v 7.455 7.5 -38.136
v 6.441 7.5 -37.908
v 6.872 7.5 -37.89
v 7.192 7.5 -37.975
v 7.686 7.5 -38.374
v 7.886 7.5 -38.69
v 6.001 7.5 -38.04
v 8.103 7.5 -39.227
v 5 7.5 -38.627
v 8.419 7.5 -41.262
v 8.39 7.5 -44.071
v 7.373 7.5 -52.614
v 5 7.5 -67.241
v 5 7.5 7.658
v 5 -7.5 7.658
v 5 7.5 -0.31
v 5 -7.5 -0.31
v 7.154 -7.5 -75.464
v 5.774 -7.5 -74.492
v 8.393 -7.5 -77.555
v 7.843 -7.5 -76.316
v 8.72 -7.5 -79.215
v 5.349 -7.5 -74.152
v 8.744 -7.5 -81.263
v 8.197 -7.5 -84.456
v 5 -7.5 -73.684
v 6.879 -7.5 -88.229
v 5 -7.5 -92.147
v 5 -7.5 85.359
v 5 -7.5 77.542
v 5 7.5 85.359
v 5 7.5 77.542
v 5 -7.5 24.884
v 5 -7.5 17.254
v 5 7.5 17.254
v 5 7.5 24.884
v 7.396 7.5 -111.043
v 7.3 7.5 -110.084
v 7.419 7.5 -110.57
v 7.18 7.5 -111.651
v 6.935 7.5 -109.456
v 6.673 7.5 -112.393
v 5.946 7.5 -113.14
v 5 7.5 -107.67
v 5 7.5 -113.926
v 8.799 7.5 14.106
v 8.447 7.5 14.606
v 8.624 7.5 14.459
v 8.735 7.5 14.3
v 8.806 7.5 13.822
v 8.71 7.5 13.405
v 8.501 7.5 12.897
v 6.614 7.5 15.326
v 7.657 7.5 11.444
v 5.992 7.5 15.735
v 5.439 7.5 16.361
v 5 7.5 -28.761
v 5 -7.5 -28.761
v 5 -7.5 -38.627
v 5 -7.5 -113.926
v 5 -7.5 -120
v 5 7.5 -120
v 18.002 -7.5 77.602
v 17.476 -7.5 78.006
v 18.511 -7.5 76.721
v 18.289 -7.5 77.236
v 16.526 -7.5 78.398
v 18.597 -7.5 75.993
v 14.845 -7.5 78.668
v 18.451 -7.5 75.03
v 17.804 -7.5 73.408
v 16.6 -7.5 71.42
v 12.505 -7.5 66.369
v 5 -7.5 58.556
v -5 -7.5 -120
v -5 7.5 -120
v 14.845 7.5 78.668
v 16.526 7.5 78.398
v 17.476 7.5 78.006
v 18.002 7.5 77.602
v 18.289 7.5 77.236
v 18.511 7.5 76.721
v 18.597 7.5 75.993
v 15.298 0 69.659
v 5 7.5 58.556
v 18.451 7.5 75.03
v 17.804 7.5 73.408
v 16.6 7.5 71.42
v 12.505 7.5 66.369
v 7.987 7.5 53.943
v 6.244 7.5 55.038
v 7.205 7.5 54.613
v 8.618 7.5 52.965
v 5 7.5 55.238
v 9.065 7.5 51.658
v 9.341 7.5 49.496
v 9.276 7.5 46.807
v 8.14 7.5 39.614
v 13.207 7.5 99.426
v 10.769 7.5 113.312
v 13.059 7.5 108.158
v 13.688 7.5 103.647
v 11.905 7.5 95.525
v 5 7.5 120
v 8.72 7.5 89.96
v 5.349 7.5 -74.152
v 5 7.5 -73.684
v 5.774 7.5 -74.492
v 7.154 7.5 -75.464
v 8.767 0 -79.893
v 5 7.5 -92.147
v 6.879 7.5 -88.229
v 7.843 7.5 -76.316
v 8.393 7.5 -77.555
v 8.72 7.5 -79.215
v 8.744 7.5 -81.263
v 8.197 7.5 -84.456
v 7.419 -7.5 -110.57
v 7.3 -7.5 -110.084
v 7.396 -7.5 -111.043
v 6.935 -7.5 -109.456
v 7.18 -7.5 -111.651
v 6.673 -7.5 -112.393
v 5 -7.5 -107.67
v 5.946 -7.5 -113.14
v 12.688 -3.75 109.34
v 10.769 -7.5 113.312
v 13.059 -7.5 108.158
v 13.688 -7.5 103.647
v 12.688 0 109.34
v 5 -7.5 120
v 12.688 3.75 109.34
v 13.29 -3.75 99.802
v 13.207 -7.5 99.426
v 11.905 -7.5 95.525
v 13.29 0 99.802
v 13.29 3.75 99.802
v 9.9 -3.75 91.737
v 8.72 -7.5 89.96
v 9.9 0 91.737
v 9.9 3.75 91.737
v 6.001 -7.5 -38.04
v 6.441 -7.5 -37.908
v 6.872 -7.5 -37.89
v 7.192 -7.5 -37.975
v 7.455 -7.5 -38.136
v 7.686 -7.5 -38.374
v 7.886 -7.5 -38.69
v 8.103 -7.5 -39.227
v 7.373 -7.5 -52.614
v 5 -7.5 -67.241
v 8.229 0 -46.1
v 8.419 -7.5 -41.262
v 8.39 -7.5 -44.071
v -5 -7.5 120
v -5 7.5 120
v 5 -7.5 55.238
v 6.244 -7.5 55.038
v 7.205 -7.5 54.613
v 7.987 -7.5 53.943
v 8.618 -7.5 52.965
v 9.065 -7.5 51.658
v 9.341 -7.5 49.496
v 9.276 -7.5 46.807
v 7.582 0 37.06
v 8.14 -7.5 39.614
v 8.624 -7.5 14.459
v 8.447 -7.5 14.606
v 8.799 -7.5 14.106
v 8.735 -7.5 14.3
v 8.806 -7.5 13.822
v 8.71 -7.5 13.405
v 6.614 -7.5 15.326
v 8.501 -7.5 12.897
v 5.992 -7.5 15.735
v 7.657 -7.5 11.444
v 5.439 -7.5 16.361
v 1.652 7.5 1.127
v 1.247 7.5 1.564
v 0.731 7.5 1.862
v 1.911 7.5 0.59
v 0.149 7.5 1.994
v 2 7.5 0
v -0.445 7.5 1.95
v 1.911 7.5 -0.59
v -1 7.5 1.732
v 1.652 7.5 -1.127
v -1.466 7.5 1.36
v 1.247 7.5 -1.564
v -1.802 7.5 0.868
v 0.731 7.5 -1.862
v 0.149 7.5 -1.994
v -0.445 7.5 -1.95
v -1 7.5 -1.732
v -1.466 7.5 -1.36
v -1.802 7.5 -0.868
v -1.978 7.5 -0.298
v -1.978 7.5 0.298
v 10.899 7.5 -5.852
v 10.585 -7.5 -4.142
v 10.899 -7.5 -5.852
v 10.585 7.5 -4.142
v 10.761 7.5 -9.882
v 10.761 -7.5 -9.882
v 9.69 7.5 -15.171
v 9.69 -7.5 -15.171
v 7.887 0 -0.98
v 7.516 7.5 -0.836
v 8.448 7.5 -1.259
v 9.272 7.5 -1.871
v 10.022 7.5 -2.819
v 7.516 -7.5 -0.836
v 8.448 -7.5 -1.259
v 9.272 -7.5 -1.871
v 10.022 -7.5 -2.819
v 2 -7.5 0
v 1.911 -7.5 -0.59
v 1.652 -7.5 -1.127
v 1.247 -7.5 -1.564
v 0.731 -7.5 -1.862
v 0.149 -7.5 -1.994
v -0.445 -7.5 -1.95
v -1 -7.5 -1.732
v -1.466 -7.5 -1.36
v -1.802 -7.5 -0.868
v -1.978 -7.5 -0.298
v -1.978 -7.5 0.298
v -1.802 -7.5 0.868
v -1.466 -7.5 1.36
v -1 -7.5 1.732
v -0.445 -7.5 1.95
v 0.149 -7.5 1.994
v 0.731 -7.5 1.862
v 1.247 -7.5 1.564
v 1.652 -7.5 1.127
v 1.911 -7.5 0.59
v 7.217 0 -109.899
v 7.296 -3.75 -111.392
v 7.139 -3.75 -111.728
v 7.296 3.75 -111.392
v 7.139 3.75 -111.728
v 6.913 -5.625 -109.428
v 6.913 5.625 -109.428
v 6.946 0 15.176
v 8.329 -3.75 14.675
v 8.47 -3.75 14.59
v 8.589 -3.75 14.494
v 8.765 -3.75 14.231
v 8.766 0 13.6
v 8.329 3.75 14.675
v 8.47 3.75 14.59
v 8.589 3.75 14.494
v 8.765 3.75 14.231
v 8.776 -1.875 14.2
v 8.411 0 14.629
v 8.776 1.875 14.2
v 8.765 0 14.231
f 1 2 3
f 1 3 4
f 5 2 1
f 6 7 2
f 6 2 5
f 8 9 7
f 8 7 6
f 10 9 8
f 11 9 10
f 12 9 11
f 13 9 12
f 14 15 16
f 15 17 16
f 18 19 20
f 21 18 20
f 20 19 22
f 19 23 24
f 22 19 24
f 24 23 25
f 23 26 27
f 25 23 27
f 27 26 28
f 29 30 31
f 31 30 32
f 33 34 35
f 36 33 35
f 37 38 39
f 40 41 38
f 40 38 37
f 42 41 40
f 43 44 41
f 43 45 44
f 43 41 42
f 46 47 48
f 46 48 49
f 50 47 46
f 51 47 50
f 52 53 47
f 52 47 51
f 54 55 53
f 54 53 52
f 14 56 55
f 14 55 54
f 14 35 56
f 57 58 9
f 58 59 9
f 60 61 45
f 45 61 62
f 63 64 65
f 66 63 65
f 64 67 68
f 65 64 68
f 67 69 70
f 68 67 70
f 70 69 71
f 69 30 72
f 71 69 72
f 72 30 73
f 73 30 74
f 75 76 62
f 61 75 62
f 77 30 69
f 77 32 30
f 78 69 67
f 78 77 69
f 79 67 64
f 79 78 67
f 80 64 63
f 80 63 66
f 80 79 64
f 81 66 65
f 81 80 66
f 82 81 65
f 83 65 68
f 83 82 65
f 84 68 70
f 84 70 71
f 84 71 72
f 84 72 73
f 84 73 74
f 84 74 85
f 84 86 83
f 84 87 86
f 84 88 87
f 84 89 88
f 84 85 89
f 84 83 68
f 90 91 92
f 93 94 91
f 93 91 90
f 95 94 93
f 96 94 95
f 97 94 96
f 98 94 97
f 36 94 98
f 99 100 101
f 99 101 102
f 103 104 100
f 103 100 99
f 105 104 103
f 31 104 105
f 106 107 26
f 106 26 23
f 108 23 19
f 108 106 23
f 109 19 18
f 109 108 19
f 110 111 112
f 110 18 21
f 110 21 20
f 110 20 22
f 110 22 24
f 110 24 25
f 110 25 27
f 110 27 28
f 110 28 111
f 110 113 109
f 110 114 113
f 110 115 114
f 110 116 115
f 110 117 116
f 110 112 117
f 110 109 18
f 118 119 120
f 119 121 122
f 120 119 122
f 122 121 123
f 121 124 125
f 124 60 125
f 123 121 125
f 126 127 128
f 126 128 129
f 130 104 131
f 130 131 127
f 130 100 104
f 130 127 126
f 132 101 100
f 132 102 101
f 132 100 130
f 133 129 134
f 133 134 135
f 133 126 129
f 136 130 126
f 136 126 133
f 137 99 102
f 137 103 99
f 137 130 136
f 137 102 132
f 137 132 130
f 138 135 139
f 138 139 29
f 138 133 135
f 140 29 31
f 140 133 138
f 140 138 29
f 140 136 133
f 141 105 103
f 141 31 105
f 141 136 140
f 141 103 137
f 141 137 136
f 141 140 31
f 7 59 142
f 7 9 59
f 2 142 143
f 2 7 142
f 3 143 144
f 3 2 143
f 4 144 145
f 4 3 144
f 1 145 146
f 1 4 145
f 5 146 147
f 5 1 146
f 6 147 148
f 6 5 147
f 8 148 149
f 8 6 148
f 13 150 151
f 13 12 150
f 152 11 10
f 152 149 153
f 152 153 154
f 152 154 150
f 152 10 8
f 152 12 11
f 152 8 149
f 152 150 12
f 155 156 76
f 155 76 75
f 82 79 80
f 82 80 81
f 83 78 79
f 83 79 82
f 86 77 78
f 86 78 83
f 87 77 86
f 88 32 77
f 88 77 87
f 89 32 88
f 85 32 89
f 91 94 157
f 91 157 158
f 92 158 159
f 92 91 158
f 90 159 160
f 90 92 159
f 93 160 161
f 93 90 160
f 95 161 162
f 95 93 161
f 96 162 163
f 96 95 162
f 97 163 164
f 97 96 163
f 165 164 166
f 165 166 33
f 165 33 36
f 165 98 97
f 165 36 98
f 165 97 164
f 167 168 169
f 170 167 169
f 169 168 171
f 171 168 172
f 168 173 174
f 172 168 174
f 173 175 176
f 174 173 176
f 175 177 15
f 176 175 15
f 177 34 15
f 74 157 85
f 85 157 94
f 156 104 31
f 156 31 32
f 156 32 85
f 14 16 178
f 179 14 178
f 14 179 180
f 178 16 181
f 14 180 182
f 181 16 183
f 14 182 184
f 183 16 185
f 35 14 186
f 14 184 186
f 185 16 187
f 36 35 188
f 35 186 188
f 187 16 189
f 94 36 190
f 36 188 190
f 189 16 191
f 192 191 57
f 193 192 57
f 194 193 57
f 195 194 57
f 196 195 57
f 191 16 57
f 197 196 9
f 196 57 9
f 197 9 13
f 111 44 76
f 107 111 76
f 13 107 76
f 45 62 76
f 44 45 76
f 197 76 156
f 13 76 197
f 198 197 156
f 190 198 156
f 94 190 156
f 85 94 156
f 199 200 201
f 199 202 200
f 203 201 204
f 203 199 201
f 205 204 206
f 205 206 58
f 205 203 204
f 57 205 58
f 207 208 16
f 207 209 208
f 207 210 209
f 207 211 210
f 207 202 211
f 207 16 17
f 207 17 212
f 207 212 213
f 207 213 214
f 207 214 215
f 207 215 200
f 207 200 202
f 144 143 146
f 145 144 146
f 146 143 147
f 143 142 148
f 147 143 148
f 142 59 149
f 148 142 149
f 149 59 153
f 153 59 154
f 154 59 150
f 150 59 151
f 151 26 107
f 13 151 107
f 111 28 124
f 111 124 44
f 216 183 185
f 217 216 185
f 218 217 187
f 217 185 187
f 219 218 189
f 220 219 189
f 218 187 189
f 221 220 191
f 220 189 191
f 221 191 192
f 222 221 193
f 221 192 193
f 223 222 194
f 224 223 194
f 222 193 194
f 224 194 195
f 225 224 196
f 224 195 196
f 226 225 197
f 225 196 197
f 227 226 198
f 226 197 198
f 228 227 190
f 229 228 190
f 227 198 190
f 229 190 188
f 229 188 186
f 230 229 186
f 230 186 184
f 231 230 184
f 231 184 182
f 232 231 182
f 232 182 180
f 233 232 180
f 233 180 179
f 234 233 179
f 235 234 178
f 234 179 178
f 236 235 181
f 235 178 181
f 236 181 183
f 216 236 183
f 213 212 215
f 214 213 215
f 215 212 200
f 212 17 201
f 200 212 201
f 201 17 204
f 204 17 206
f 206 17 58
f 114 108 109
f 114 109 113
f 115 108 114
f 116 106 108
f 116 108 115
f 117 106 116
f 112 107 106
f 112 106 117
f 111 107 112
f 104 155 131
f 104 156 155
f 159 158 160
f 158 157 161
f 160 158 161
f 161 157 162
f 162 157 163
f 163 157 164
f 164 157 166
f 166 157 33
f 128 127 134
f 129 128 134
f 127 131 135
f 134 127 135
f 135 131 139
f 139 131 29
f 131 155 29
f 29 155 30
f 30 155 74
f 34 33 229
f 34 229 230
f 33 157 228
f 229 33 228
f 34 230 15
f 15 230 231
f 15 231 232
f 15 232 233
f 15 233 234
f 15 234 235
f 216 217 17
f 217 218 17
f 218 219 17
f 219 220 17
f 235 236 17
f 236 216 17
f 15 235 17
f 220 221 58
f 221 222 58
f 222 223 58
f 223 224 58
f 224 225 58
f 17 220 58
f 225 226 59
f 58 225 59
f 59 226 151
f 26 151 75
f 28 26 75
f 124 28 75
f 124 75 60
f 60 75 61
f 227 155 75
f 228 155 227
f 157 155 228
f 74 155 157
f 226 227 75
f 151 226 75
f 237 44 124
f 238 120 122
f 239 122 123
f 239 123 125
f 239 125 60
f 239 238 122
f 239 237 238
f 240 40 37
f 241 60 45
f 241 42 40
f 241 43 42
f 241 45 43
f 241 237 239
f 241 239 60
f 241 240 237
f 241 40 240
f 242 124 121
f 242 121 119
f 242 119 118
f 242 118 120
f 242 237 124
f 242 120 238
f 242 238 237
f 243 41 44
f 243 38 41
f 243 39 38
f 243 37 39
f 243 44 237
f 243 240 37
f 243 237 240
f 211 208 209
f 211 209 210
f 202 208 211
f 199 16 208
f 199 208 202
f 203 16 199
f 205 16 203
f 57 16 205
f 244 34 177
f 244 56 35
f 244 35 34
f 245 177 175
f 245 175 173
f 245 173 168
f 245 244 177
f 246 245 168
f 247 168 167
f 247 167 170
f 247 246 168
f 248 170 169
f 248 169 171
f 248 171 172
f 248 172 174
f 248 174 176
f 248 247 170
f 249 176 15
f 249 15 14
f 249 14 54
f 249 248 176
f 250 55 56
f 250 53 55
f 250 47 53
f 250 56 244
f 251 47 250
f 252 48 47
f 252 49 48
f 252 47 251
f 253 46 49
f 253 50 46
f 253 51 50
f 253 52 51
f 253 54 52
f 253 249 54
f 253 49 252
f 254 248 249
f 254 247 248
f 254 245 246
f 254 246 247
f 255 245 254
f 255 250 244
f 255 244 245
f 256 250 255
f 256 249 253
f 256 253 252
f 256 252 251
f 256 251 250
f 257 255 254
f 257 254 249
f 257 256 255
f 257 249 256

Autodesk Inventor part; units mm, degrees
ref_plane "YZ Plane" through (0, 0, 0) normal (1, 0, 0) x (0, 1, 0)
ref_plane "XZ Plane" through (0, 0, 0) normal (0, 1, 0) x (-1, 0, 0)
ref_plane "XY Plane" through (0, 0, 0) normal (0, 0, 1) x (1, 0, 0)
sketch "Эскиз1" plane through (0, 0, 0) normal (0, 0, 1) x (1, 0, 0)
  line L0 (-5, -7.5) -> (5, -7.5)
  line L1 (5, -7.5) -> (5, 7.5)
  line L2 (5, 7.5) -> (-5, 7.5)
  line L3 (-5, 7.5) -> (-5, -7.5)
  line L4 (-5, -7.5) -> (5, 7.5) construction
  line L5 (5, -7.5) -> (-5, 7.5) construction
  point P0 (0, 0)
  dimension "d0" = 10
  dimension "d1" = 15
extrude "Выдавливание1" add sketch "Эскиз1" along normal mid plane 240
sketch "Эскиз3" plane through (-5, 7.5, 120) normal (0, 1, 0) x (1, 0, 0)
  line L0 (10, 0) -> (22.4133, 11.0717) construction
  line L1 (10, 240) -> (10, 0) projected
  line L2 (18.7544, 123.2595) -> (14.9087, 136.6513) construction
  line L3 (14.9087, 136.6513) -> (10, 148.7613) construction
  line L4 (12.2217, 156.9873) -> (15.1095, 158.4366) construction
  line L5 (10, 158.6272) -> (12.2217, 156.9873) construction
  spline S0 degree 4 poles (10, 120.3104) (10.6885, 120.4) (14.5524, 120.9622) (18.7544, 123.2595) (14.9087, 136.6513) (10, 148.7613) knots 7.806725 7.806725 7.806725 7.806725 7.806725 8 8.816044 8.816044 8.816044 8.816044 8.816044
  line L6 (16.1722, 104.0435) -> (12.6846, 108.5719) construction
  line L7 (12.6846, 108.5719) -> (10, 112.3423) construction
  line L8 (14.5524, 120.9622) -> (18.7544, 123.2595) construction
  line L9 (10.6885, 120.4) -> (14.5524, 120.9622) construction
  line L10 (10, 120.3104) -> (10.6885, 120.4) construction
  line L11 (19.5701, 51.9157) -> (11.8452, 59.5335) construction
  line L12 (11.8452, 59.5335) -> (10, 61.4441) construction
  line L13 (12.6625, 64.9164) -> (17.1948, 66.8214) construction
  line L14 (10, 64.7616) -> (12.6625, 64.9164) construction
  spline S1 degree 4 poles (10, 0) (22.4133, 11.0717) (20.5125, 21.2759) (14.9788, 29.1456) (10, 34.6409) knots 1 1 1 1 1 1.479533 1.479533 1.479533 1.479533 1.479533
  spline S2 degree 4 poles (10, 42.4578) (17.8063, 40.9171) (31.518, 38.9171) (19.5701, 51.9157) (11.8452, 59.5335) (10, 61.4441) knots 2.157548 2.157548 2.157548 2.157548 2.157548 3 3.460409 3.460409 3.460409 3.460409 3.460409
  line L15 (22.4133, 11.0717) -> (20.5125, 21.2759) construction
  line L16 (20.5125, 21.2759) -> (14.9788, 29.1456) construction
  line L17 (14.9788, 29.1456) -> (10, 34.6409) construction
  line L18 (31.518, 38.9171) -> (19.5701, 51.9157) construction
  line L19 (17.8063, 40.9171) -> (31.518, 38.9171) construction
  line L20 (10, 42.4578) -> (17.8063, 40.9171) construction
  spline S3 degree 4 poles (10, 64.7616) (12.6625, 64.9164) (17.1948, 66.8214) (12.7242, 81.5872) (10.4023, 92.5211) (10, 95.1158) knots 4.079114 4.079114 4.079114 4.079114 4.079114 5 5.351232 5.351232 5.351232 5.351232 5.351232
  spline S4 degree 4 poles (10, 102.7457) (10.3255, 103.6616) (12.3365, 106.1869) (16.1722, 104.0435) (12.6846, 108.5719) (10, 112.3423) knots 5.710697 5.710697 5.710697 5.710697 5.710697 6 6.927418 6.927418 6.927418 6.927418 6.927418
  line L21 (17.1948, 66.8214) -> (12.7242, 81.5872) construction
  line L22 (12.7242, 81.5872) -> (10.4023, 92.5211) construction
  line L23 (10.4023, 92.5211) -> (10, 95.1158) construction
  line L24 (12.3365, 106.1869) -> (16.1722, 104.0435) construction
  line L25 (10.3255, 103.6616) -> (12.3365, 106.1869) construction
  line L26 (10, 102.7457) -> (10.3255, 103.6616) construction
  spline S5 degree 4 poles (10, 158.6272) (12.2217, 156.9873) (15.1095, 158.4366) (12.3637, 173.2023) (10.5216, 183.4118) (10, 187.241) knots 10.452108 10.452108 10.452108 10.452108 10.452108 11 11.609642 11.609642 11.609642 11.609642 11.609642
  line L27 (15.1095, 158.4366) -> (12.3637, 173.2023) construction
  line L28 (12.3637, 173.2023) -> (10.5216, 183.4118) construction
  line L29 (10.5216, 183.4118) -> (10, 187.241) construction
  line L30 (10.7467, 195.0702) -> (13.4688, 194.3249) construction
  line L31 (10, 193.6844) -> (10.7467, 195.0702) construction
  spline S6 degree 4 poles (10, 193.6844) (10.7467, 195.0702) (13.4688, 194.3249) (15.4545, 200.7955) (11.7294, 208.8265) (10, 212.1471) knots 12.053463 12.053463 12.053463 12.053463 12.053463 13 13.695165 13.695165 13.695165 13.695165 13.695165
  spline S7 degree 4 poles (10, 227.67) (10.6941, 228.2247) (12.3194, 229.5337) (13.2597, 230.885) (11.5359, 232.7441) (10, 233.9261) knots 14.764065 14.764065 14.764065 14.764065 14.764065 15 15.335911 15.335911 15.335911 15.335911 15.335911
  line L32 (13.4688, 194.3249) -> (15.4545, 200.7955) construction
  line L33 (15.4545, 200.7955) -> (11.7294, 208.8265) construction
  line L34 (11.7294, 208.8265) -> (10, 212.1471) construction
  line L35 (10.6941, 228.2247) -> (12.3194, 229.5337) construction
  line L36 (10, 227.67) -> (10.6941, 228.2247) construction
  line L37 (12.3194, 229.5337) -> (13.2597, 230.885) construction
  line L38 (13.2597, 230.885) -> (11.5359, 232.7441) construction
  line L39 (11.5359, 232.7441) -> (10, 233.9261) construction
  point P0 (5, 120)
extrude "Выдавливание3" add sketch "Эскиз3" against normal blind 15
sketch "Эскиз4" plane through (-5, 7.5, -120) normal (0, 1, 0) x (1, 0, 0)
  line L0 (0, -240) -> (0, -120) construction
  line L1 (0, 0) -> (0, -240) construction
  circle A0 centre (5, -120) radius 2
  dimension "d15" = 4
extrude "Выдавливание4" cut sketch "Эскиз4" against normal blind 15
properties part number "Nozzle"
